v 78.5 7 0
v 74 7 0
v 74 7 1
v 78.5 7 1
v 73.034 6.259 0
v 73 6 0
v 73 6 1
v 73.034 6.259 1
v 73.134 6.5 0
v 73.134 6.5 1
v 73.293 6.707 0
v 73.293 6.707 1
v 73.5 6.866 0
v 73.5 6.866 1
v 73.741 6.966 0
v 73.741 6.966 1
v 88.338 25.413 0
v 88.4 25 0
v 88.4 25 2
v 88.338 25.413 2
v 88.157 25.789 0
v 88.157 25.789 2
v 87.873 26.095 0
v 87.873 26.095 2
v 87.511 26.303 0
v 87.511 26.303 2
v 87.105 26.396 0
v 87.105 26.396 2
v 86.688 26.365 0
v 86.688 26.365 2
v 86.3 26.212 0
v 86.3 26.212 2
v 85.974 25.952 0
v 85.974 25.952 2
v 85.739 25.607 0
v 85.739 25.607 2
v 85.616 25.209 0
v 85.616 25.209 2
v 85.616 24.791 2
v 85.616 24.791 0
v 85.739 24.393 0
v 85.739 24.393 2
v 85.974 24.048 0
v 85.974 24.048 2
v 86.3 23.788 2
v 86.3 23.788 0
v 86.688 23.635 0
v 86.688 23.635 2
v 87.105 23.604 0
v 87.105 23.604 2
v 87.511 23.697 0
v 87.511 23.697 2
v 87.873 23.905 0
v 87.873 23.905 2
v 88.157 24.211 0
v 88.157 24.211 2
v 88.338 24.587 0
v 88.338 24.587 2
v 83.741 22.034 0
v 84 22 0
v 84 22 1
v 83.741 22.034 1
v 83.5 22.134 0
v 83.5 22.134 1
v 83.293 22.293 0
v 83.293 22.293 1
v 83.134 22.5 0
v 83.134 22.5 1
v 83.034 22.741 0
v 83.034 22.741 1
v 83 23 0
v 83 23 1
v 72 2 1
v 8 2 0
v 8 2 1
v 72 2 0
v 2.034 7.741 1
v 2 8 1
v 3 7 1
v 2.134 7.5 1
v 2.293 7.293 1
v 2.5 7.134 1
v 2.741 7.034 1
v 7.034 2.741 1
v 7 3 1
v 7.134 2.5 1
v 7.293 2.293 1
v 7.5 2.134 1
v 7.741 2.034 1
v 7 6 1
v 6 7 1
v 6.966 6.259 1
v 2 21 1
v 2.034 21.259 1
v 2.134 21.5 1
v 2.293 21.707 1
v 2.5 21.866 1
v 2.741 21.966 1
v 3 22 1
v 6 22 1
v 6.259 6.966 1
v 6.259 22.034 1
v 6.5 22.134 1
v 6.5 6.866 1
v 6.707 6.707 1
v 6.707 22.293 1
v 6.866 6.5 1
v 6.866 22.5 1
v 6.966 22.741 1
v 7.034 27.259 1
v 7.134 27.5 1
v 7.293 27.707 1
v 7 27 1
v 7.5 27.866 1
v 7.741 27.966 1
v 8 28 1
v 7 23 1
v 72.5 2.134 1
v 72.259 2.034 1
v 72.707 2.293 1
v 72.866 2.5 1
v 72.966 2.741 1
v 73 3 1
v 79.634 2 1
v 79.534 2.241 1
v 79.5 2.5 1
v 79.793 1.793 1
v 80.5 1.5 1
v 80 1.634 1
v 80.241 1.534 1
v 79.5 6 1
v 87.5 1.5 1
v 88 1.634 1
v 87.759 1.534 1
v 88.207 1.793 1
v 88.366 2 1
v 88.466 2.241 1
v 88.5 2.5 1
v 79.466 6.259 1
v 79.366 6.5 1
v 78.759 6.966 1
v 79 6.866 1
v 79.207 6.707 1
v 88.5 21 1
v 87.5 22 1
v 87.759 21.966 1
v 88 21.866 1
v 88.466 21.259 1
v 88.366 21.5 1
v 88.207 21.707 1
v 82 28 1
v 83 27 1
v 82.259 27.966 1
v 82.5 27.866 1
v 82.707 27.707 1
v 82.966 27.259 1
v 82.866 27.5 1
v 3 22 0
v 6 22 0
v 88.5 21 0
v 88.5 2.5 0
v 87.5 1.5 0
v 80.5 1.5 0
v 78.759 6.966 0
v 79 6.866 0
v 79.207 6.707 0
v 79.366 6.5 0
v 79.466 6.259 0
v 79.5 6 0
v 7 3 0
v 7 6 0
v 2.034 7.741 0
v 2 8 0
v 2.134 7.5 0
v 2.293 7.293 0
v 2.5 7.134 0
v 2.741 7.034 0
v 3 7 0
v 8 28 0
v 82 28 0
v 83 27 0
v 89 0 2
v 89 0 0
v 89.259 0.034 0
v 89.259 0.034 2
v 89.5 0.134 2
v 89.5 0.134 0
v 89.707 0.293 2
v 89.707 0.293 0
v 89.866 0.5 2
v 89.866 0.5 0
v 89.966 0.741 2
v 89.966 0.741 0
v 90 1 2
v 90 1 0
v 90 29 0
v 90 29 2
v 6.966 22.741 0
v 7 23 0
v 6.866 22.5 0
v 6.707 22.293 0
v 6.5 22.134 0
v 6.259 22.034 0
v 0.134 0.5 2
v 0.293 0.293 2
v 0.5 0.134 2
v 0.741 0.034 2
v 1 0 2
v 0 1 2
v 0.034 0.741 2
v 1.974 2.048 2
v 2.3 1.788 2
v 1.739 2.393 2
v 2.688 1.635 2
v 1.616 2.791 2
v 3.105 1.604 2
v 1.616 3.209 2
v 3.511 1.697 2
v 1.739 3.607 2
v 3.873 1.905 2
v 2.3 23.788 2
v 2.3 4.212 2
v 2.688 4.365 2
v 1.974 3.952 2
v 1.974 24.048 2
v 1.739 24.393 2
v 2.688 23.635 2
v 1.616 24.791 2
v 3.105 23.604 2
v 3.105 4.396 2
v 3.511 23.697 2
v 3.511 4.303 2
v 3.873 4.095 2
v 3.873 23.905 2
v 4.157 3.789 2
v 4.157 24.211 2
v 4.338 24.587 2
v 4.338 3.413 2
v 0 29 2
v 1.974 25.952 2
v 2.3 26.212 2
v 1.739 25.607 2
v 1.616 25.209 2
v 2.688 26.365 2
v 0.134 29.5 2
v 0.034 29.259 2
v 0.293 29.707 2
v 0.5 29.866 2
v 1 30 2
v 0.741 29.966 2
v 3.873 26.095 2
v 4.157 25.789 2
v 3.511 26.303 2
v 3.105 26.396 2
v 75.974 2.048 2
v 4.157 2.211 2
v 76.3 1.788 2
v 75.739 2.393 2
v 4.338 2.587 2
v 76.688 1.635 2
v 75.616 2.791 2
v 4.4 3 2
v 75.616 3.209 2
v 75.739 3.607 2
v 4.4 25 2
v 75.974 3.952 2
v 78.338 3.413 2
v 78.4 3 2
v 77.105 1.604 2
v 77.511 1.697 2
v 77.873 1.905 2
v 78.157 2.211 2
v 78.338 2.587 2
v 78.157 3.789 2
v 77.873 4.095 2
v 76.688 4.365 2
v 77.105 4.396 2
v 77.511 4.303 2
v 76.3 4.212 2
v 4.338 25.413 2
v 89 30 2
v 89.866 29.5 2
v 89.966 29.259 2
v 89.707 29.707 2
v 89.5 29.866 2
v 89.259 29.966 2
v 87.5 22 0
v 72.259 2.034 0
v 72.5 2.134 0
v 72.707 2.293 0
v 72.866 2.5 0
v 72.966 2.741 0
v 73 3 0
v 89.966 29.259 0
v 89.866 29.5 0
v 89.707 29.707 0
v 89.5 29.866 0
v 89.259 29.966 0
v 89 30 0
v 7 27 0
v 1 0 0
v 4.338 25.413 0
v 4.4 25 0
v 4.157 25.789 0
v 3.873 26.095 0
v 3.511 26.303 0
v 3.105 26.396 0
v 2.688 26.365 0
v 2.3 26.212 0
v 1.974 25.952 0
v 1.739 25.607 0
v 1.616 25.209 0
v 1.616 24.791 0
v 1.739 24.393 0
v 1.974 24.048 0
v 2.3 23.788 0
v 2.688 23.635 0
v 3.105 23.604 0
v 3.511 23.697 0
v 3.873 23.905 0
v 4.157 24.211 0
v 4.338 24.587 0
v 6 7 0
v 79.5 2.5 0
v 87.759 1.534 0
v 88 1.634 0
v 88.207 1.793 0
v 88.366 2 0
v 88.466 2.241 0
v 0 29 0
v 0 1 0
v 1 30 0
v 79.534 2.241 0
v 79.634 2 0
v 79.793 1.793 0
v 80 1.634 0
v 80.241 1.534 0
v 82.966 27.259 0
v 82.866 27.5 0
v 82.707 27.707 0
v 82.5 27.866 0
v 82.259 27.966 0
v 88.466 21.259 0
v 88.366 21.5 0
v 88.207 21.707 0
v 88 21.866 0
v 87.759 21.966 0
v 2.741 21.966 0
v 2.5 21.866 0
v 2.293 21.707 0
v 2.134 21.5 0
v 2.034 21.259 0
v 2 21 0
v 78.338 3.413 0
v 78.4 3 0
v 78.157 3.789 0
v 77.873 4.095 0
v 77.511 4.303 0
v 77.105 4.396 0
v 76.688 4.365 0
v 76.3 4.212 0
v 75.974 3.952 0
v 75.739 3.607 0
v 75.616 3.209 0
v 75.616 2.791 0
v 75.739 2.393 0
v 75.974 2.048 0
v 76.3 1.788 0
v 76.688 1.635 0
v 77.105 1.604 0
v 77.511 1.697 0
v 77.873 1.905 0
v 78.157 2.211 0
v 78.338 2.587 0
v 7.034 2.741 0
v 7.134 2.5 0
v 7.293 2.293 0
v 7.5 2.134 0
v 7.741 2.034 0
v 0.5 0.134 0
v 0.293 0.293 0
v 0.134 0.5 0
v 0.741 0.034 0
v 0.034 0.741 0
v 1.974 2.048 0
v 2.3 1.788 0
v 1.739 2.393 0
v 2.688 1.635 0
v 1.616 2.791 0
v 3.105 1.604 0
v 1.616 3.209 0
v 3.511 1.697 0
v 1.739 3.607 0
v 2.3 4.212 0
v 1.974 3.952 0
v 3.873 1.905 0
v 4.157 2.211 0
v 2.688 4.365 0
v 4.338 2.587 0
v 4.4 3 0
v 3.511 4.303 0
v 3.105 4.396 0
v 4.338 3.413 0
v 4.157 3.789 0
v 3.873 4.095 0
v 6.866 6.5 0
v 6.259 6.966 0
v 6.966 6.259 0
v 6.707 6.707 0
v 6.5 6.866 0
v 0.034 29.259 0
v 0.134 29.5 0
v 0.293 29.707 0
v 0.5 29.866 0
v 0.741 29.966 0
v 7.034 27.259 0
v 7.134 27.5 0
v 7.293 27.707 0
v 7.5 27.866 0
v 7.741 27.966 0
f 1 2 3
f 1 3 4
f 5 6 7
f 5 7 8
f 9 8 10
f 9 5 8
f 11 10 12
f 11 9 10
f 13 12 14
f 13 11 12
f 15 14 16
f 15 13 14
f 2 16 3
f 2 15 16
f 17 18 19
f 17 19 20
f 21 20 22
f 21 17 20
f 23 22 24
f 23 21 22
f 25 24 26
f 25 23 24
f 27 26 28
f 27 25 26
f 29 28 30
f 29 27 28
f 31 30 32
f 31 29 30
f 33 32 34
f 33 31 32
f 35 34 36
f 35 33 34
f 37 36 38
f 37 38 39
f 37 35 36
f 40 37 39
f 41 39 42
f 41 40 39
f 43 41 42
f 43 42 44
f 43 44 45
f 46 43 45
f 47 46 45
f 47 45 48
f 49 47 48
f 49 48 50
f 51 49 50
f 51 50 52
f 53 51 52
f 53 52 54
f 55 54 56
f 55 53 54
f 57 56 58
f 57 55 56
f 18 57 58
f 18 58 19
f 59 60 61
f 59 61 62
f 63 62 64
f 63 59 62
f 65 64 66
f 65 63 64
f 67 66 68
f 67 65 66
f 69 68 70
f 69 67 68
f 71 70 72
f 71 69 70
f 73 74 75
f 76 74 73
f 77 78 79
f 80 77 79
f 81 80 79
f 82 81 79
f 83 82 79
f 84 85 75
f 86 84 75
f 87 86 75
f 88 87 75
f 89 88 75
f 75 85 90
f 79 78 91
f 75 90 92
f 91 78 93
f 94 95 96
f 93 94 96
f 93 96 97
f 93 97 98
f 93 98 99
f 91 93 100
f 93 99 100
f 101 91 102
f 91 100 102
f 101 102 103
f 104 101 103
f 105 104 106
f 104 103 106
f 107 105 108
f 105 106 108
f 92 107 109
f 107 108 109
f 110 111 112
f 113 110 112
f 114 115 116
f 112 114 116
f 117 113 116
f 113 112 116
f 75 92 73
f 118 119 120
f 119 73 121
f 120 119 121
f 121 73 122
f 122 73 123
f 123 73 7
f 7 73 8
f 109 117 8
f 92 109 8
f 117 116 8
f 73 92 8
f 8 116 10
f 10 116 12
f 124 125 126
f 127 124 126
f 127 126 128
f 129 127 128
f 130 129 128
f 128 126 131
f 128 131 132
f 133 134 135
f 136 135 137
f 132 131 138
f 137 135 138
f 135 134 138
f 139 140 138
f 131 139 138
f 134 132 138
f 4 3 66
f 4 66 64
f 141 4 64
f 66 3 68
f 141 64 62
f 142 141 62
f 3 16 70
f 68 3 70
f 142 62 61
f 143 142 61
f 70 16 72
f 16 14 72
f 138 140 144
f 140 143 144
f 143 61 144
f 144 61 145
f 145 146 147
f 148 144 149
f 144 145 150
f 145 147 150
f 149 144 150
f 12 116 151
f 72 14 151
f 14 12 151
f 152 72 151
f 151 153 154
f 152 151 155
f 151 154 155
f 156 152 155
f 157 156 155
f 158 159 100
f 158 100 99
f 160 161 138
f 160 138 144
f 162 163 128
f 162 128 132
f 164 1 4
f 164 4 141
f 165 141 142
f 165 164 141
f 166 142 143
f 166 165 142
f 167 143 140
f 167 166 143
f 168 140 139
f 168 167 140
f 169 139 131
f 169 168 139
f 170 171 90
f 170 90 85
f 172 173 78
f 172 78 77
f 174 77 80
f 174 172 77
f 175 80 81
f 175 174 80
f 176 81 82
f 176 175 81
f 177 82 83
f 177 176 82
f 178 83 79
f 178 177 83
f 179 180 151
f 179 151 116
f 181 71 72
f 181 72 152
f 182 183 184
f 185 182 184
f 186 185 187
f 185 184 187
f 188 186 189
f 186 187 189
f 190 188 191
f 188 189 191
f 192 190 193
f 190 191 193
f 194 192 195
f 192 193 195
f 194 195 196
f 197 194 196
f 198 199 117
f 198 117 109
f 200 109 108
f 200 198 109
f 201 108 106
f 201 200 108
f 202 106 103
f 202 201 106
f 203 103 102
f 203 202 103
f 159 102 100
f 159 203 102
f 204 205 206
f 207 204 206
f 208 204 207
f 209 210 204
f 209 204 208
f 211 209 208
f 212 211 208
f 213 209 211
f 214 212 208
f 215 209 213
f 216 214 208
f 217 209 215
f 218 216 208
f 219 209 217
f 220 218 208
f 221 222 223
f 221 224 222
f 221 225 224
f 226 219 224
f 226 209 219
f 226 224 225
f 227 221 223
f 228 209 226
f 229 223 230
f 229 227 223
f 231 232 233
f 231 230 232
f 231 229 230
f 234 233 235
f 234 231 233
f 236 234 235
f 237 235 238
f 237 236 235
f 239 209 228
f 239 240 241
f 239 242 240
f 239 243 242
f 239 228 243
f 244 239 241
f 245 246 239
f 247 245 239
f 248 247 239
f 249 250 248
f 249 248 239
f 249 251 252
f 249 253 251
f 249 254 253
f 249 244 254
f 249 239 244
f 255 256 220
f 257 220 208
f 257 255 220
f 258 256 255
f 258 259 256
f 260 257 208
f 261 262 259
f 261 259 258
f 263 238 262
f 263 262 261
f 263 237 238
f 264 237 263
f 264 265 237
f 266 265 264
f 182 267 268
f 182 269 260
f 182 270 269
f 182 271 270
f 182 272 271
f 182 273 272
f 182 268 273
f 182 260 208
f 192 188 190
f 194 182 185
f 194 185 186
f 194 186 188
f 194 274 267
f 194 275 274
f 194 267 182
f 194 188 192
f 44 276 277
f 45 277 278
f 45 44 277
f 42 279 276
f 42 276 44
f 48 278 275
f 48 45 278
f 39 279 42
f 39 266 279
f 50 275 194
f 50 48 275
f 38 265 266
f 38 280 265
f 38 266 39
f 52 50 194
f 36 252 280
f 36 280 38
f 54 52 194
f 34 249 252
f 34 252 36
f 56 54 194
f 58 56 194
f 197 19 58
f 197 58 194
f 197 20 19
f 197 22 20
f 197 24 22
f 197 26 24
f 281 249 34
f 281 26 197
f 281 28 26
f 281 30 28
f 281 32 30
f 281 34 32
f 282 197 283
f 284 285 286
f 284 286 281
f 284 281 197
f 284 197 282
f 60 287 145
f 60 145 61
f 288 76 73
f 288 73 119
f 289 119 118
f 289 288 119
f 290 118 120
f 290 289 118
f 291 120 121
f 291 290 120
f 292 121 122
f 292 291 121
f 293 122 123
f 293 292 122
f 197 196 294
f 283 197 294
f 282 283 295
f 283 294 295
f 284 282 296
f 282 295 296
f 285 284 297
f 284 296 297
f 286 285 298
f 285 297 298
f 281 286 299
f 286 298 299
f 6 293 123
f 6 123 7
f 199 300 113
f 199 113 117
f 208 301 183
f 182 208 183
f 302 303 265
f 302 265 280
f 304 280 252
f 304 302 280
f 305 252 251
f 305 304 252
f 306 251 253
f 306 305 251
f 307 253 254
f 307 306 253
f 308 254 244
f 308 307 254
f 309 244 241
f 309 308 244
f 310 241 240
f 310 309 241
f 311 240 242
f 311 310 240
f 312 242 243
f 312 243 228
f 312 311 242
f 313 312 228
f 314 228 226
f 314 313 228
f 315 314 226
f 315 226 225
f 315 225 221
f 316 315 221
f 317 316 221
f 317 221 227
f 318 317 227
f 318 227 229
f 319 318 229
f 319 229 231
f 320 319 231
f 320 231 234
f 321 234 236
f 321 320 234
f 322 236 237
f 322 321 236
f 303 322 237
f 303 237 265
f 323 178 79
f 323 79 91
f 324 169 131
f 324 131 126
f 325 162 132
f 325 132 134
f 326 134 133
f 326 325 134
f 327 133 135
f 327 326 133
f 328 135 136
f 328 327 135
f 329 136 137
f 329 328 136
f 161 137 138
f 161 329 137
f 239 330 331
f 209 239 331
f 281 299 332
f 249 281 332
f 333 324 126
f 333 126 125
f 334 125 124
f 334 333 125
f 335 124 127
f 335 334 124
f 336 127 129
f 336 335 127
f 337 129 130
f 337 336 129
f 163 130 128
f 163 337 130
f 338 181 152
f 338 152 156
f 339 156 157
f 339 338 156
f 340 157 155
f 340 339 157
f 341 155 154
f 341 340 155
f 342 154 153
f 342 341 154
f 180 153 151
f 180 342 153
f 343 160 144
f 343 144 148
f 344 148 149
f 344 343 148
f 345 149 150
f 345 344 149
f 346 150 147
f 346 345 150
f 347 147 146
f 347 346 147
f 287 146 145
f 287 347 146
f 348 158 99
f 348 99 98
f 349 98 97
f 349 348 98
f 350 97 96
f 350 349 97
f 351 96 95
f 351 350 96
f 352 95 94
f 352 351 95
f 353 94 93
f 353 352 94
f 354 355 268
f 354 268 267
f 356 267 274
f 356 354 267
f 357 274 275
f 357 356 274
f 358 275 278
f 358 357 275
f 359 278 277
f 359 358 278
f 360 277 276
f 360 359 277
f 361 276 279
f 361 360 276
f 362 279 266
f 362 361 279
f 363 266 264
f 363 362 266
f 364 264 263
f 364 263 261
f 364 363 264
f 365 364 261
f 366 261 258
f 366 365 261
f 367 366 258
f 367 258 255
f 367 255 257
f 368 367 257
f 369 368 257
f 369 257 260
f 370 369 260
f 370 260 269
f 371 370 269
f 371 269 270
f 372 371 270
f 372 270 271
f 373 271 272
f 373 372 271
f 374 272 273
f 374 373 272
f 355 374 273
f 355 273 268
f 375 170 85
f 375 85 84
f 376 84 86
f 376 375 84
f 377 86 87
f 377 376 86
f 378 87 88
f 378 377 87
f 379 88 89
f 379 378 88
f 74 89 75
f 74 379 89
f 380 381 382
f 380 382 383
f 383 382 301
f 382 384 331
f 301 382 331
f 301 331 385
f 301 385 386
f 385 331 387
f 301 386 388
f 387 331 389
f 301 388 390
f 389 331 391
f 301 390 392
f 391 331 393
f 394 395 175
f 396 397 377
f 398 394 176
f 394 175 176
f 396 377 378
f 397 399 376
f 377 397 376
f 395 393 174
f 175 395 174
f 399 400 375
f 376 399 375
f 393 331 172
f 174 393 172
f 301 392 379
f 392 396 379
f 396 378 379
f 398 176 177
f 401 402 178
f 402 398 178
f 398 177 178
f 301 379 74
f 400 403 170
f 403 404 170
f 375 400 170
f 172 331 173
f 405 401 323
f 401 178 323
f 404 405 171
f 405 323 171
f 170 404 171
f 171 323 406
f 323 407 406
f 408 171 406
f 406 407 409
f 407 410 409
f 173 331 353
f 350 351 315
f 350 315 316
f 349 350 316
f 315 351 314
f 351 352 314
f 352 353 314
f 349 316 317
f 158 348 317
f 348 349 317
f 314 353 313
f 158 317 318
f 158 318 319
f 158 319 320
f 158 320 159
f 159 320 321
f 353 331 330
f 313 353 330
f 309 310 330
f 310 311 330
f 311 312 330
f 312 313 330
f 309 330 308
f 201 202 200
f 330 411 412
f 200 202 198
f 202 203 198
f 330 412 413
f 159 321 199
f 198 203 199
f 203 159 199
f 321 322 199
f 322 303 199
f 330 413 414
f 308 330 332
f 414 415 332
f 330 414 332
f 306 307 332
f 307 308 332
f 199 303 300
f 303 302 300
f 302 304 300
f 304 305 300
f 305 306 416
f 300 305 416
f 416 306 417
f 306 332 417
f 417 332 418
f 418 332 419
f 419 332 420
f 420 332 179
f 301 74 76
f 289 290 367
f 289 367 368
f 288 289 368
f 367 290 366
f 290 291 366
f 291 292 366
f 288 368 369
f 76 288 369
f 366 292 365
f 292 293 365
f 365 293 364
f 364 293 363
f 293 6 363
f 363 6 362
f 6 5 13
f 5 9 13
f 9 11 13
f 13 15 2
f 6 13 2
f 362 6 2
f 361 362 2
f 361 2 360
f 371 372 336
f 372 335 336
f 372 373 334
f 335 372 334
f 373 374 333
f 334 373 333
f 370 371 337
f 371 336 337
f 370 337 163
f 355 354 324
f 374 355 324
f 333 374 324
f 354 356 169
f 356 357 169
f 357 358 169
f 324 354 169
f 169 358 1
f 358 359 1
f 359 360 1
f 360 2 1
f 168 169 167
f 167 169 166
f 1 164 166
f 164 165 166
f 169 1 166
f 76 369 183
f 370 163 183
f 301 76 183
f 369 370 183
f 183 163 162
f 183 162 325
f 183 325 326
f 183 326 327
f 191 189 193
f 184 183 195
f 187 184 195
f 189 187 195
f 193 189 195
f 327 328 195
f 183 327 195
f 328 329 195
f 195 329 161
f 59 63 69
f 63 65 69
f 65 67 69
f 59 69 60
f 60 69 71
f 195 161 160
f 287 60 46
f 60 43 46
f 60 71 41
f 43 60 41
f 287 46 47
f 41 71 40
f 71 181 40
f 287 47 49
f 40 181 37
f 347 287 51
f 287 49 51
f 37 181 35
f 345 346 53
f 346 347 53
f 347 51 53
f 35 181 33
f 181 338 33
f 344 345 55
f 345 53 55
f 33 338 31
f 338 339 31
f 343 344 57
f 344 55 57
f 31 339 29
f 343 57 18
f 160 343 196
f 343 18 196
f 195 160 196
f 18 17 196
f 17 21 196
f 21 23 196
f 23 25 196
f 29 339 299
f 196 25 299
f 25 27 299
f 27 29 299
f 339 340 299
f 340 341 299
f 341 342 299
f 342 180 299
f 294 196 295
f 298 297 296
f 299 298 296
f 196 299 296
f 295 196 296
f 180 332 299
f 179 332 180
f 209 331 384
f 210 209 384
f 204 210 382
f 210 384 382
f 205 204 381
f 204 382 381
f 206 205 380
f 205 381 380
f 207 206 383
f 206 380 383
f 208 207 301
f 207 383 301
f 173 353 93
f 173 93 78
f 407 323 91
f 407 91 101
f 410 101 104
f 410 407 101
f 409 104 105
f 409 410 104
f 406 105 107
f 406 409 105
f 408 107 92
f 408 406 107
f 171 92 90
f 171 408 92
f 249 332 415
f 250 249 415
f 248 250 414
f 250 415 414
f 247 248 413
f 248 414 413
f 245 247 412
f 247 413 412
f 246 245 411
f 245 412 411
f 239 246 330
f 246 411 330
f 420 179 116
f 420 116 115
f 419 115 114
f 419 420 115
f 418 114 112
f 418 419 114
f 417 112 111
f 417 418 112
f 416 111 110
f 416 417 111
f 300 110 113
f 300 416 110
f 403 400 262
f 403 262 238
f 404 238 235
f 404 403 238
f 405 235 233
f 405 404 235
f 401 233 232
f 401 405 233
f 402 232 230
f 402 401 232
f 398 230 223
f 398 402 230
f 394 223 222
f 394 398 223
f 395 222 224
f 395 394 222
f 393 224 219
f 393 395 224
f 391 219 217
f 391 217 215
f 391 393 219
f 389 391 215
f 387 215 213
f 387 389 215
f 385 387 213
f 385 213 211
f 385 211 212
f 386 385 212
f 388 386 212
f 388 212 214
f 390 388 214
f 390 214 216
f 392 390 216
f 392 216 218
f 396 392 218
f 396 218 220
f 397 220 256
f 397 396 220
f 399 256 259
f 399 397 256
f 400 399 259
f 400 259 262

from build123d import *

# Parameters (mm, degrees)
SKETCH_1_R          = 1.4
EXTRUDE_1_DEPTH     = 2
CUT_EXTRUDE_1_DEPTH = 1


with BuildPart() as part:
    # Эскиз1 → Бобышка-Вытянуть1 (new body)
    with BuildSketch(Plane.XY):
        with BuildLine():
            Line((78, 0), (89, 0))
            ThreePointArc((89, 0), (89.707106781, 0.292893219), (90, 1))
            Line((90, 1), (90, 12))
            Line((90, 12), (90, 29))
            ThreePointArc((90, 29), (89.707106781, 29.707106781), (89, 30))
            Line((89, 30), (1, 30))
            ThreePointArc((1, 30), (0.292893219, 29.707106781), (0, 29))
            Line((0, 29), (0, 1))
            ThreePointArc((0, 1), (0.292893219, 0.292893219), (1, 0))
            Line((1, 0), (60.966683233, 0))
            Line((60.966683233, 0), (78, 0))
        make_face()
        with Locations((3, 3)):
            Circle(SKETCH_1_R, mode=Mode.SUBTRACT)
        with Locations((3, 25)):
            Circle(SKETCH_1_R, mode=Mode.SUBTRACT)
        with Locations((87, 25)):
            Circle(SKETCH_1_R, mode=Mode.SUBTRACT)
        with Locations((77, 3)):
            Circle(SKETCH_1_R, mode=Mode.SUBTRACT)
    extrude(amount=EXTRUDE_1_DEPTH)

    # Эскиз2 → Вырез-Вытянуть1 (cut)
    with BuildSketch(Plane(origin=(0, 0, 0), x_dir=(-1, 0, 0), z_dir=(0, 0, -1))):
        with BuildLine():
            Line((-82, 28), (-8, 28))
            ThreePointArc((-8, 28), (-7.292893219, 27.707106781), (-7, 27))
            Line((-7, 27), (-7, 23))
            ThreePointArc((-7, 23), (-6.707106781, 22.292893219), (-6, 22))
            Line((-6, 22), (-3, 22))
            ThreePointArc((-3, 22), (-2.292893219, 21.707106781), (-2, 21))
            Line((-2, 21), (-2, 8))
            ThreePointArc((-2, 8), (-2.292893219, 7.292893219), (-3, 7))
            Line((-3, 7), (-6, 7))
            ThreePointArc((-6, 7), (-6.707106781, 6.707106781), (-7, 6))
            Line((-7, 6), (-7, 3))
            ThreePointArc((-7, 3), (-7.292893219, 2.292893219), (-8, 2))
            Line((-8, 2), (-72, 2))
            ThreePointArc((-72, 2), (-72.707106781, 2.292893219), (-73, 3))
            Line((-73, 3), (-73, 6))
            ThreePointArc((-73, 6), (-73.292893219, 6.707106781), (-74, 7))
            Line((-74, 7), (-78.5, 7))
            ThreePointArc((-78.5, 7), (-79.207106781, 6.707106781), (-79.5, 6))
            Line((-79.5, 6), (-79.5, 2.5))
            ThreePointArc((-79.5, 2.5), (-79.792893219, 1.792893219), (-80.5, 1.5))
            Line((-80.5, 1.5), (-87.5, 1.5))
            ThreePointArc((-87.5, 1.5), (-88.207106781, 1.792893219), (-88.5, 2.5))
            Line((-88.5, 2.5), (-88.5, 21))
            ThreePointArc((-88.5, 21), (-88.207106781, 21.707106781), (-87.5, 22))
            Line((-87.5, 22), (-84, 22))
            ThreePointArc((-84, 22), (-83.292893219, 22.292893219), (-83, 23))
            Line((-83, 23), (-83, 27))
            ThreePointArc((-83, 27), (-82.707106781, 27.707106781), (-82, 28))
        make_face()
    extrude(amount=-CUT_EXTRUDE_1_DEPTH, mode=Mode.SUBTRACT)


solid = part.part
